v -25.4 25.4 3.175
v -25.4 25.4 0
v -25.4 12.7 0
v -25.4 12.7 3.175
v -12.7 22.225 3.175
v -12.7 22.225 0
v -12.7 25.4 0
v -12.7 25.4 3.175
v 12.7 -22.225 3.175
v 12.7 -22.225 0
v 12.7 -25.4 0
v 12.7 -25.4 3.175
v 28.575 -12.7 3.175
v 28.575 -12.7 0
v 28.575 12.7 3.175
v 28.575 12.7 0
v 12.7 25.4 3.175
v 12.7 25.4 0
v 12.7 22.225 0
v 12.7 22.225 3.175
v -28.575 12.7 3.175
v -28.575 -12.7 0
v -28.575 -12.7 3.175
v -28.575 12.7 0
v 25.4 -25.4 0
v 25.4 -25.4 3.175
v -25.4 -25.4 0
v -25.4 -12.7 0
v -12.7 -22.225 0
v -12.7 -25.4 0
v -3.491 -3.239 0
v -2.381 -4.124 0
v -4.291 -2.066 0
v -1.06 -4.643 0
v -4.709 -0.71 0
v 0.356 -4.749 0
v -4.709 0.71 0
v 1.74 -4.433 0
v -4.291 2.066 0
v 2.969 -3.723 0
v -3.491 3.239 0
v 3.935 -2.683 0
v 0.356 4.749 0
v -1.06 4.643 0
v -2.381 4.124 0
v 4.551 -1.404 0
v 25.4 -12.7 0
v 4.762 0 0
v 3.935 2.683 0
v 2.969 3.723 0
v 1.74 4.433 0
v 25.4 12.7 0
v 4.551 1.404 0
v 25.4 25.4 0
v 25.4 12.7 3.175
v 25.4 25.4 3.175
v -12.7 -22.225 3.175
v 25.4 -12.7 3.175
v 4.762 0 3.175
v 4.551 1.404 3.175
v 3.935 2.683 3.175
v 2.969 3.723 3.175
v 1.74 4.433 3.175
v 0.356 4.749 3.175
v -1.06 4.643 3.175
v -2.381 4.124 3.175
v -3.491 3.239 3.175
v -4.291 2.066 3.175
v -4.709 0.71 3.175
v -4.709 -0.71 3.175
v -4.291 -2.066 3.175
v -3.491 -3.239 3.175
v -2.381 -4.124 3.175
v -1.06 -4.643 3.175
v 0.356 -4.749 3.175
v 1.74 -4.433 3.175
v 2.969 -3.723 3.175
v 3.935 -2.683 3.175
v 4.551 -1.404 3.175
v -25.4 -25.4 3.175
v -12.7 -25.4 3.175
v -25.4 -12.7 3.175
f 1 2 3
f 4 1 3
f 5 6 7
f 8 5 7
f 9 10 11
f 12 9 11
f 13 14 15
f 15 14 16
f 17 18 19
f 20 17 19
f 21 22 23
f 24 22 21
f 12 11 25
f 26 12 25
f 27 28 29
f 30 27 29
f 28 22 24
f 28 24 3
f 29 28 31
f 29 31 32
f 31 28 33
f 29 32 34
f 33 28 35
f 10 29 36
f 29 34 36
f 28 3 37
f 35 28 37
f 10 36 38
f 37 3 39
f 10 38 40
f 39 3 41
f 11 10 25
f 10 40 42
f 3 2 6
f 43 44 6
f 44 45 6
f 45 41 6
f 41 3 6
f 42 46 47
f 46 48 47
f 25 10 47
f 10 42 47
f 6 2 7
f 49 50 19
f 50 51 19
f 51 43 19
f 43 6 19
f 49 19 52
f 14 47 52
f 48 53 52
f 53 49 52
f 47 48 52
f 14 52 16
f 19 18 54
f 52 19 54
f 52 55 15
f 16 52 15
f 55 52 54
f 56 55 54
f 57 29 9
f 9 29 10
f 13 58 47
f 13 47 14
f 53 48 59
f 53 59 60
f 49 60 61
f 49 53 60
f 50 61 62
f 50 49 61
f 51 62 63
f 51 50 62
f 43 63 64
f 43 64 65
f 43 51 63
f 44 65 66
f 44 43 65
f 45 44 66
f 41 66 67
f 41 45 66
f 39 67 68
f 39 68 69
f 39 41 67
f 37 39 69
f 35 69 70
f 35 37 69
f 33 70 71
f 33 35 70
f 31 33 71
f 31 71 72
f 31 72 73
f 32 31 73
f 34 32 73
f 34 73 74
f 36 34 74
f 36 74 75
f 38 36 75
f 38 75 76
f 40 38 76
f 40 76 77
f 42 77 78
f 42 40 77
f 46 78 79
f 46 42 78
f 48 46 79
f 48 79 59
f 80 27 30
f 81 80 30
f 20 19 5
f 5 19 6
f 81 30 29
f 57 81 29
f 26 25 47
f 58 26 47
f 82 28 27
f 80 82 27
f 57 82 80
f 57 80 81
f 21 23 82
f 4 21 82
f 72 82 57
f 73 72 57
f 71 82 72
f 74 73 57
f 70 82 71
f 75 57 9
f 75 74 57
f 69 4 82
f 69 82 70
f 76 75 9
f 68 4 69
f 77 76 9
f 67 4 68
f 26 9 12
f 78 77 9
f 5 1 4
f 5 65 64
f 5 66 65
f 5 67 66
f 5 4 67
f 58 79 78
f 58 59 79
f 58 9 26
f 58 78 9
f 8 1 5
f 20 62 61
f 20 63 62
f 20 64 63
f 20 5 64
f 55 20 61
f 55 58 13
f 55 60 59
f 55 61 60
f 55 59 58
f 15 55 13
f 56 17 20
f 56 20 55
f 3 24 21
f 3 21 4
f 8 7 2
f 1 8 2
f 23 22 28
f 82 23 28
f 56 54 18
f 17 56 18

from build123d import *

# Parameters (mm, degrees)
F0_R     = 4.7625
F0_W     = 3.175
F0_H     = 25.4
F1_DEPTH = 3.175


with BuildPart() as f1:
    # F0 (on Top) → F1 (new body)
    with BuildSketch(Plane.XY):
        Polygon((25.4, 12.7), (25.4, 25.4), (12.7, 25.4), (12.7, 22.225), (-12.7, 22.225), (-12.7, 25.4), (-25.4, 25.4), (-25.4, 12.7), (-22.225, 12.7), (-22.225, -12.7), (-25.4, -12.7), (-25.4, -25.4), (-12.7, -25.4), (-12.7, -22.225), (12.7, -22.225), (12.7, -25.4), (25.4, -25.4), (25.4, -12.7), (22.225, -12.7), (22.225, 12.7), align=None)
        Circle(F0_R, mode=Mode.SUBTRACT)
        with Locations((-26.9875, 0)):
            Rectangle(F0_W, F0_H)
        with Locations((-23.8125, 0)):
            Rectangle(F0_W, F0_H)
        with Locations((26.9875, 0)):
            Rectangle(F0_W, F0_H)
        with Locations((23.8125, 0)):
            Rectangle(F0_W, F0_H)
    extrude(amount=F1_DEPTH)


solid = f1.part
